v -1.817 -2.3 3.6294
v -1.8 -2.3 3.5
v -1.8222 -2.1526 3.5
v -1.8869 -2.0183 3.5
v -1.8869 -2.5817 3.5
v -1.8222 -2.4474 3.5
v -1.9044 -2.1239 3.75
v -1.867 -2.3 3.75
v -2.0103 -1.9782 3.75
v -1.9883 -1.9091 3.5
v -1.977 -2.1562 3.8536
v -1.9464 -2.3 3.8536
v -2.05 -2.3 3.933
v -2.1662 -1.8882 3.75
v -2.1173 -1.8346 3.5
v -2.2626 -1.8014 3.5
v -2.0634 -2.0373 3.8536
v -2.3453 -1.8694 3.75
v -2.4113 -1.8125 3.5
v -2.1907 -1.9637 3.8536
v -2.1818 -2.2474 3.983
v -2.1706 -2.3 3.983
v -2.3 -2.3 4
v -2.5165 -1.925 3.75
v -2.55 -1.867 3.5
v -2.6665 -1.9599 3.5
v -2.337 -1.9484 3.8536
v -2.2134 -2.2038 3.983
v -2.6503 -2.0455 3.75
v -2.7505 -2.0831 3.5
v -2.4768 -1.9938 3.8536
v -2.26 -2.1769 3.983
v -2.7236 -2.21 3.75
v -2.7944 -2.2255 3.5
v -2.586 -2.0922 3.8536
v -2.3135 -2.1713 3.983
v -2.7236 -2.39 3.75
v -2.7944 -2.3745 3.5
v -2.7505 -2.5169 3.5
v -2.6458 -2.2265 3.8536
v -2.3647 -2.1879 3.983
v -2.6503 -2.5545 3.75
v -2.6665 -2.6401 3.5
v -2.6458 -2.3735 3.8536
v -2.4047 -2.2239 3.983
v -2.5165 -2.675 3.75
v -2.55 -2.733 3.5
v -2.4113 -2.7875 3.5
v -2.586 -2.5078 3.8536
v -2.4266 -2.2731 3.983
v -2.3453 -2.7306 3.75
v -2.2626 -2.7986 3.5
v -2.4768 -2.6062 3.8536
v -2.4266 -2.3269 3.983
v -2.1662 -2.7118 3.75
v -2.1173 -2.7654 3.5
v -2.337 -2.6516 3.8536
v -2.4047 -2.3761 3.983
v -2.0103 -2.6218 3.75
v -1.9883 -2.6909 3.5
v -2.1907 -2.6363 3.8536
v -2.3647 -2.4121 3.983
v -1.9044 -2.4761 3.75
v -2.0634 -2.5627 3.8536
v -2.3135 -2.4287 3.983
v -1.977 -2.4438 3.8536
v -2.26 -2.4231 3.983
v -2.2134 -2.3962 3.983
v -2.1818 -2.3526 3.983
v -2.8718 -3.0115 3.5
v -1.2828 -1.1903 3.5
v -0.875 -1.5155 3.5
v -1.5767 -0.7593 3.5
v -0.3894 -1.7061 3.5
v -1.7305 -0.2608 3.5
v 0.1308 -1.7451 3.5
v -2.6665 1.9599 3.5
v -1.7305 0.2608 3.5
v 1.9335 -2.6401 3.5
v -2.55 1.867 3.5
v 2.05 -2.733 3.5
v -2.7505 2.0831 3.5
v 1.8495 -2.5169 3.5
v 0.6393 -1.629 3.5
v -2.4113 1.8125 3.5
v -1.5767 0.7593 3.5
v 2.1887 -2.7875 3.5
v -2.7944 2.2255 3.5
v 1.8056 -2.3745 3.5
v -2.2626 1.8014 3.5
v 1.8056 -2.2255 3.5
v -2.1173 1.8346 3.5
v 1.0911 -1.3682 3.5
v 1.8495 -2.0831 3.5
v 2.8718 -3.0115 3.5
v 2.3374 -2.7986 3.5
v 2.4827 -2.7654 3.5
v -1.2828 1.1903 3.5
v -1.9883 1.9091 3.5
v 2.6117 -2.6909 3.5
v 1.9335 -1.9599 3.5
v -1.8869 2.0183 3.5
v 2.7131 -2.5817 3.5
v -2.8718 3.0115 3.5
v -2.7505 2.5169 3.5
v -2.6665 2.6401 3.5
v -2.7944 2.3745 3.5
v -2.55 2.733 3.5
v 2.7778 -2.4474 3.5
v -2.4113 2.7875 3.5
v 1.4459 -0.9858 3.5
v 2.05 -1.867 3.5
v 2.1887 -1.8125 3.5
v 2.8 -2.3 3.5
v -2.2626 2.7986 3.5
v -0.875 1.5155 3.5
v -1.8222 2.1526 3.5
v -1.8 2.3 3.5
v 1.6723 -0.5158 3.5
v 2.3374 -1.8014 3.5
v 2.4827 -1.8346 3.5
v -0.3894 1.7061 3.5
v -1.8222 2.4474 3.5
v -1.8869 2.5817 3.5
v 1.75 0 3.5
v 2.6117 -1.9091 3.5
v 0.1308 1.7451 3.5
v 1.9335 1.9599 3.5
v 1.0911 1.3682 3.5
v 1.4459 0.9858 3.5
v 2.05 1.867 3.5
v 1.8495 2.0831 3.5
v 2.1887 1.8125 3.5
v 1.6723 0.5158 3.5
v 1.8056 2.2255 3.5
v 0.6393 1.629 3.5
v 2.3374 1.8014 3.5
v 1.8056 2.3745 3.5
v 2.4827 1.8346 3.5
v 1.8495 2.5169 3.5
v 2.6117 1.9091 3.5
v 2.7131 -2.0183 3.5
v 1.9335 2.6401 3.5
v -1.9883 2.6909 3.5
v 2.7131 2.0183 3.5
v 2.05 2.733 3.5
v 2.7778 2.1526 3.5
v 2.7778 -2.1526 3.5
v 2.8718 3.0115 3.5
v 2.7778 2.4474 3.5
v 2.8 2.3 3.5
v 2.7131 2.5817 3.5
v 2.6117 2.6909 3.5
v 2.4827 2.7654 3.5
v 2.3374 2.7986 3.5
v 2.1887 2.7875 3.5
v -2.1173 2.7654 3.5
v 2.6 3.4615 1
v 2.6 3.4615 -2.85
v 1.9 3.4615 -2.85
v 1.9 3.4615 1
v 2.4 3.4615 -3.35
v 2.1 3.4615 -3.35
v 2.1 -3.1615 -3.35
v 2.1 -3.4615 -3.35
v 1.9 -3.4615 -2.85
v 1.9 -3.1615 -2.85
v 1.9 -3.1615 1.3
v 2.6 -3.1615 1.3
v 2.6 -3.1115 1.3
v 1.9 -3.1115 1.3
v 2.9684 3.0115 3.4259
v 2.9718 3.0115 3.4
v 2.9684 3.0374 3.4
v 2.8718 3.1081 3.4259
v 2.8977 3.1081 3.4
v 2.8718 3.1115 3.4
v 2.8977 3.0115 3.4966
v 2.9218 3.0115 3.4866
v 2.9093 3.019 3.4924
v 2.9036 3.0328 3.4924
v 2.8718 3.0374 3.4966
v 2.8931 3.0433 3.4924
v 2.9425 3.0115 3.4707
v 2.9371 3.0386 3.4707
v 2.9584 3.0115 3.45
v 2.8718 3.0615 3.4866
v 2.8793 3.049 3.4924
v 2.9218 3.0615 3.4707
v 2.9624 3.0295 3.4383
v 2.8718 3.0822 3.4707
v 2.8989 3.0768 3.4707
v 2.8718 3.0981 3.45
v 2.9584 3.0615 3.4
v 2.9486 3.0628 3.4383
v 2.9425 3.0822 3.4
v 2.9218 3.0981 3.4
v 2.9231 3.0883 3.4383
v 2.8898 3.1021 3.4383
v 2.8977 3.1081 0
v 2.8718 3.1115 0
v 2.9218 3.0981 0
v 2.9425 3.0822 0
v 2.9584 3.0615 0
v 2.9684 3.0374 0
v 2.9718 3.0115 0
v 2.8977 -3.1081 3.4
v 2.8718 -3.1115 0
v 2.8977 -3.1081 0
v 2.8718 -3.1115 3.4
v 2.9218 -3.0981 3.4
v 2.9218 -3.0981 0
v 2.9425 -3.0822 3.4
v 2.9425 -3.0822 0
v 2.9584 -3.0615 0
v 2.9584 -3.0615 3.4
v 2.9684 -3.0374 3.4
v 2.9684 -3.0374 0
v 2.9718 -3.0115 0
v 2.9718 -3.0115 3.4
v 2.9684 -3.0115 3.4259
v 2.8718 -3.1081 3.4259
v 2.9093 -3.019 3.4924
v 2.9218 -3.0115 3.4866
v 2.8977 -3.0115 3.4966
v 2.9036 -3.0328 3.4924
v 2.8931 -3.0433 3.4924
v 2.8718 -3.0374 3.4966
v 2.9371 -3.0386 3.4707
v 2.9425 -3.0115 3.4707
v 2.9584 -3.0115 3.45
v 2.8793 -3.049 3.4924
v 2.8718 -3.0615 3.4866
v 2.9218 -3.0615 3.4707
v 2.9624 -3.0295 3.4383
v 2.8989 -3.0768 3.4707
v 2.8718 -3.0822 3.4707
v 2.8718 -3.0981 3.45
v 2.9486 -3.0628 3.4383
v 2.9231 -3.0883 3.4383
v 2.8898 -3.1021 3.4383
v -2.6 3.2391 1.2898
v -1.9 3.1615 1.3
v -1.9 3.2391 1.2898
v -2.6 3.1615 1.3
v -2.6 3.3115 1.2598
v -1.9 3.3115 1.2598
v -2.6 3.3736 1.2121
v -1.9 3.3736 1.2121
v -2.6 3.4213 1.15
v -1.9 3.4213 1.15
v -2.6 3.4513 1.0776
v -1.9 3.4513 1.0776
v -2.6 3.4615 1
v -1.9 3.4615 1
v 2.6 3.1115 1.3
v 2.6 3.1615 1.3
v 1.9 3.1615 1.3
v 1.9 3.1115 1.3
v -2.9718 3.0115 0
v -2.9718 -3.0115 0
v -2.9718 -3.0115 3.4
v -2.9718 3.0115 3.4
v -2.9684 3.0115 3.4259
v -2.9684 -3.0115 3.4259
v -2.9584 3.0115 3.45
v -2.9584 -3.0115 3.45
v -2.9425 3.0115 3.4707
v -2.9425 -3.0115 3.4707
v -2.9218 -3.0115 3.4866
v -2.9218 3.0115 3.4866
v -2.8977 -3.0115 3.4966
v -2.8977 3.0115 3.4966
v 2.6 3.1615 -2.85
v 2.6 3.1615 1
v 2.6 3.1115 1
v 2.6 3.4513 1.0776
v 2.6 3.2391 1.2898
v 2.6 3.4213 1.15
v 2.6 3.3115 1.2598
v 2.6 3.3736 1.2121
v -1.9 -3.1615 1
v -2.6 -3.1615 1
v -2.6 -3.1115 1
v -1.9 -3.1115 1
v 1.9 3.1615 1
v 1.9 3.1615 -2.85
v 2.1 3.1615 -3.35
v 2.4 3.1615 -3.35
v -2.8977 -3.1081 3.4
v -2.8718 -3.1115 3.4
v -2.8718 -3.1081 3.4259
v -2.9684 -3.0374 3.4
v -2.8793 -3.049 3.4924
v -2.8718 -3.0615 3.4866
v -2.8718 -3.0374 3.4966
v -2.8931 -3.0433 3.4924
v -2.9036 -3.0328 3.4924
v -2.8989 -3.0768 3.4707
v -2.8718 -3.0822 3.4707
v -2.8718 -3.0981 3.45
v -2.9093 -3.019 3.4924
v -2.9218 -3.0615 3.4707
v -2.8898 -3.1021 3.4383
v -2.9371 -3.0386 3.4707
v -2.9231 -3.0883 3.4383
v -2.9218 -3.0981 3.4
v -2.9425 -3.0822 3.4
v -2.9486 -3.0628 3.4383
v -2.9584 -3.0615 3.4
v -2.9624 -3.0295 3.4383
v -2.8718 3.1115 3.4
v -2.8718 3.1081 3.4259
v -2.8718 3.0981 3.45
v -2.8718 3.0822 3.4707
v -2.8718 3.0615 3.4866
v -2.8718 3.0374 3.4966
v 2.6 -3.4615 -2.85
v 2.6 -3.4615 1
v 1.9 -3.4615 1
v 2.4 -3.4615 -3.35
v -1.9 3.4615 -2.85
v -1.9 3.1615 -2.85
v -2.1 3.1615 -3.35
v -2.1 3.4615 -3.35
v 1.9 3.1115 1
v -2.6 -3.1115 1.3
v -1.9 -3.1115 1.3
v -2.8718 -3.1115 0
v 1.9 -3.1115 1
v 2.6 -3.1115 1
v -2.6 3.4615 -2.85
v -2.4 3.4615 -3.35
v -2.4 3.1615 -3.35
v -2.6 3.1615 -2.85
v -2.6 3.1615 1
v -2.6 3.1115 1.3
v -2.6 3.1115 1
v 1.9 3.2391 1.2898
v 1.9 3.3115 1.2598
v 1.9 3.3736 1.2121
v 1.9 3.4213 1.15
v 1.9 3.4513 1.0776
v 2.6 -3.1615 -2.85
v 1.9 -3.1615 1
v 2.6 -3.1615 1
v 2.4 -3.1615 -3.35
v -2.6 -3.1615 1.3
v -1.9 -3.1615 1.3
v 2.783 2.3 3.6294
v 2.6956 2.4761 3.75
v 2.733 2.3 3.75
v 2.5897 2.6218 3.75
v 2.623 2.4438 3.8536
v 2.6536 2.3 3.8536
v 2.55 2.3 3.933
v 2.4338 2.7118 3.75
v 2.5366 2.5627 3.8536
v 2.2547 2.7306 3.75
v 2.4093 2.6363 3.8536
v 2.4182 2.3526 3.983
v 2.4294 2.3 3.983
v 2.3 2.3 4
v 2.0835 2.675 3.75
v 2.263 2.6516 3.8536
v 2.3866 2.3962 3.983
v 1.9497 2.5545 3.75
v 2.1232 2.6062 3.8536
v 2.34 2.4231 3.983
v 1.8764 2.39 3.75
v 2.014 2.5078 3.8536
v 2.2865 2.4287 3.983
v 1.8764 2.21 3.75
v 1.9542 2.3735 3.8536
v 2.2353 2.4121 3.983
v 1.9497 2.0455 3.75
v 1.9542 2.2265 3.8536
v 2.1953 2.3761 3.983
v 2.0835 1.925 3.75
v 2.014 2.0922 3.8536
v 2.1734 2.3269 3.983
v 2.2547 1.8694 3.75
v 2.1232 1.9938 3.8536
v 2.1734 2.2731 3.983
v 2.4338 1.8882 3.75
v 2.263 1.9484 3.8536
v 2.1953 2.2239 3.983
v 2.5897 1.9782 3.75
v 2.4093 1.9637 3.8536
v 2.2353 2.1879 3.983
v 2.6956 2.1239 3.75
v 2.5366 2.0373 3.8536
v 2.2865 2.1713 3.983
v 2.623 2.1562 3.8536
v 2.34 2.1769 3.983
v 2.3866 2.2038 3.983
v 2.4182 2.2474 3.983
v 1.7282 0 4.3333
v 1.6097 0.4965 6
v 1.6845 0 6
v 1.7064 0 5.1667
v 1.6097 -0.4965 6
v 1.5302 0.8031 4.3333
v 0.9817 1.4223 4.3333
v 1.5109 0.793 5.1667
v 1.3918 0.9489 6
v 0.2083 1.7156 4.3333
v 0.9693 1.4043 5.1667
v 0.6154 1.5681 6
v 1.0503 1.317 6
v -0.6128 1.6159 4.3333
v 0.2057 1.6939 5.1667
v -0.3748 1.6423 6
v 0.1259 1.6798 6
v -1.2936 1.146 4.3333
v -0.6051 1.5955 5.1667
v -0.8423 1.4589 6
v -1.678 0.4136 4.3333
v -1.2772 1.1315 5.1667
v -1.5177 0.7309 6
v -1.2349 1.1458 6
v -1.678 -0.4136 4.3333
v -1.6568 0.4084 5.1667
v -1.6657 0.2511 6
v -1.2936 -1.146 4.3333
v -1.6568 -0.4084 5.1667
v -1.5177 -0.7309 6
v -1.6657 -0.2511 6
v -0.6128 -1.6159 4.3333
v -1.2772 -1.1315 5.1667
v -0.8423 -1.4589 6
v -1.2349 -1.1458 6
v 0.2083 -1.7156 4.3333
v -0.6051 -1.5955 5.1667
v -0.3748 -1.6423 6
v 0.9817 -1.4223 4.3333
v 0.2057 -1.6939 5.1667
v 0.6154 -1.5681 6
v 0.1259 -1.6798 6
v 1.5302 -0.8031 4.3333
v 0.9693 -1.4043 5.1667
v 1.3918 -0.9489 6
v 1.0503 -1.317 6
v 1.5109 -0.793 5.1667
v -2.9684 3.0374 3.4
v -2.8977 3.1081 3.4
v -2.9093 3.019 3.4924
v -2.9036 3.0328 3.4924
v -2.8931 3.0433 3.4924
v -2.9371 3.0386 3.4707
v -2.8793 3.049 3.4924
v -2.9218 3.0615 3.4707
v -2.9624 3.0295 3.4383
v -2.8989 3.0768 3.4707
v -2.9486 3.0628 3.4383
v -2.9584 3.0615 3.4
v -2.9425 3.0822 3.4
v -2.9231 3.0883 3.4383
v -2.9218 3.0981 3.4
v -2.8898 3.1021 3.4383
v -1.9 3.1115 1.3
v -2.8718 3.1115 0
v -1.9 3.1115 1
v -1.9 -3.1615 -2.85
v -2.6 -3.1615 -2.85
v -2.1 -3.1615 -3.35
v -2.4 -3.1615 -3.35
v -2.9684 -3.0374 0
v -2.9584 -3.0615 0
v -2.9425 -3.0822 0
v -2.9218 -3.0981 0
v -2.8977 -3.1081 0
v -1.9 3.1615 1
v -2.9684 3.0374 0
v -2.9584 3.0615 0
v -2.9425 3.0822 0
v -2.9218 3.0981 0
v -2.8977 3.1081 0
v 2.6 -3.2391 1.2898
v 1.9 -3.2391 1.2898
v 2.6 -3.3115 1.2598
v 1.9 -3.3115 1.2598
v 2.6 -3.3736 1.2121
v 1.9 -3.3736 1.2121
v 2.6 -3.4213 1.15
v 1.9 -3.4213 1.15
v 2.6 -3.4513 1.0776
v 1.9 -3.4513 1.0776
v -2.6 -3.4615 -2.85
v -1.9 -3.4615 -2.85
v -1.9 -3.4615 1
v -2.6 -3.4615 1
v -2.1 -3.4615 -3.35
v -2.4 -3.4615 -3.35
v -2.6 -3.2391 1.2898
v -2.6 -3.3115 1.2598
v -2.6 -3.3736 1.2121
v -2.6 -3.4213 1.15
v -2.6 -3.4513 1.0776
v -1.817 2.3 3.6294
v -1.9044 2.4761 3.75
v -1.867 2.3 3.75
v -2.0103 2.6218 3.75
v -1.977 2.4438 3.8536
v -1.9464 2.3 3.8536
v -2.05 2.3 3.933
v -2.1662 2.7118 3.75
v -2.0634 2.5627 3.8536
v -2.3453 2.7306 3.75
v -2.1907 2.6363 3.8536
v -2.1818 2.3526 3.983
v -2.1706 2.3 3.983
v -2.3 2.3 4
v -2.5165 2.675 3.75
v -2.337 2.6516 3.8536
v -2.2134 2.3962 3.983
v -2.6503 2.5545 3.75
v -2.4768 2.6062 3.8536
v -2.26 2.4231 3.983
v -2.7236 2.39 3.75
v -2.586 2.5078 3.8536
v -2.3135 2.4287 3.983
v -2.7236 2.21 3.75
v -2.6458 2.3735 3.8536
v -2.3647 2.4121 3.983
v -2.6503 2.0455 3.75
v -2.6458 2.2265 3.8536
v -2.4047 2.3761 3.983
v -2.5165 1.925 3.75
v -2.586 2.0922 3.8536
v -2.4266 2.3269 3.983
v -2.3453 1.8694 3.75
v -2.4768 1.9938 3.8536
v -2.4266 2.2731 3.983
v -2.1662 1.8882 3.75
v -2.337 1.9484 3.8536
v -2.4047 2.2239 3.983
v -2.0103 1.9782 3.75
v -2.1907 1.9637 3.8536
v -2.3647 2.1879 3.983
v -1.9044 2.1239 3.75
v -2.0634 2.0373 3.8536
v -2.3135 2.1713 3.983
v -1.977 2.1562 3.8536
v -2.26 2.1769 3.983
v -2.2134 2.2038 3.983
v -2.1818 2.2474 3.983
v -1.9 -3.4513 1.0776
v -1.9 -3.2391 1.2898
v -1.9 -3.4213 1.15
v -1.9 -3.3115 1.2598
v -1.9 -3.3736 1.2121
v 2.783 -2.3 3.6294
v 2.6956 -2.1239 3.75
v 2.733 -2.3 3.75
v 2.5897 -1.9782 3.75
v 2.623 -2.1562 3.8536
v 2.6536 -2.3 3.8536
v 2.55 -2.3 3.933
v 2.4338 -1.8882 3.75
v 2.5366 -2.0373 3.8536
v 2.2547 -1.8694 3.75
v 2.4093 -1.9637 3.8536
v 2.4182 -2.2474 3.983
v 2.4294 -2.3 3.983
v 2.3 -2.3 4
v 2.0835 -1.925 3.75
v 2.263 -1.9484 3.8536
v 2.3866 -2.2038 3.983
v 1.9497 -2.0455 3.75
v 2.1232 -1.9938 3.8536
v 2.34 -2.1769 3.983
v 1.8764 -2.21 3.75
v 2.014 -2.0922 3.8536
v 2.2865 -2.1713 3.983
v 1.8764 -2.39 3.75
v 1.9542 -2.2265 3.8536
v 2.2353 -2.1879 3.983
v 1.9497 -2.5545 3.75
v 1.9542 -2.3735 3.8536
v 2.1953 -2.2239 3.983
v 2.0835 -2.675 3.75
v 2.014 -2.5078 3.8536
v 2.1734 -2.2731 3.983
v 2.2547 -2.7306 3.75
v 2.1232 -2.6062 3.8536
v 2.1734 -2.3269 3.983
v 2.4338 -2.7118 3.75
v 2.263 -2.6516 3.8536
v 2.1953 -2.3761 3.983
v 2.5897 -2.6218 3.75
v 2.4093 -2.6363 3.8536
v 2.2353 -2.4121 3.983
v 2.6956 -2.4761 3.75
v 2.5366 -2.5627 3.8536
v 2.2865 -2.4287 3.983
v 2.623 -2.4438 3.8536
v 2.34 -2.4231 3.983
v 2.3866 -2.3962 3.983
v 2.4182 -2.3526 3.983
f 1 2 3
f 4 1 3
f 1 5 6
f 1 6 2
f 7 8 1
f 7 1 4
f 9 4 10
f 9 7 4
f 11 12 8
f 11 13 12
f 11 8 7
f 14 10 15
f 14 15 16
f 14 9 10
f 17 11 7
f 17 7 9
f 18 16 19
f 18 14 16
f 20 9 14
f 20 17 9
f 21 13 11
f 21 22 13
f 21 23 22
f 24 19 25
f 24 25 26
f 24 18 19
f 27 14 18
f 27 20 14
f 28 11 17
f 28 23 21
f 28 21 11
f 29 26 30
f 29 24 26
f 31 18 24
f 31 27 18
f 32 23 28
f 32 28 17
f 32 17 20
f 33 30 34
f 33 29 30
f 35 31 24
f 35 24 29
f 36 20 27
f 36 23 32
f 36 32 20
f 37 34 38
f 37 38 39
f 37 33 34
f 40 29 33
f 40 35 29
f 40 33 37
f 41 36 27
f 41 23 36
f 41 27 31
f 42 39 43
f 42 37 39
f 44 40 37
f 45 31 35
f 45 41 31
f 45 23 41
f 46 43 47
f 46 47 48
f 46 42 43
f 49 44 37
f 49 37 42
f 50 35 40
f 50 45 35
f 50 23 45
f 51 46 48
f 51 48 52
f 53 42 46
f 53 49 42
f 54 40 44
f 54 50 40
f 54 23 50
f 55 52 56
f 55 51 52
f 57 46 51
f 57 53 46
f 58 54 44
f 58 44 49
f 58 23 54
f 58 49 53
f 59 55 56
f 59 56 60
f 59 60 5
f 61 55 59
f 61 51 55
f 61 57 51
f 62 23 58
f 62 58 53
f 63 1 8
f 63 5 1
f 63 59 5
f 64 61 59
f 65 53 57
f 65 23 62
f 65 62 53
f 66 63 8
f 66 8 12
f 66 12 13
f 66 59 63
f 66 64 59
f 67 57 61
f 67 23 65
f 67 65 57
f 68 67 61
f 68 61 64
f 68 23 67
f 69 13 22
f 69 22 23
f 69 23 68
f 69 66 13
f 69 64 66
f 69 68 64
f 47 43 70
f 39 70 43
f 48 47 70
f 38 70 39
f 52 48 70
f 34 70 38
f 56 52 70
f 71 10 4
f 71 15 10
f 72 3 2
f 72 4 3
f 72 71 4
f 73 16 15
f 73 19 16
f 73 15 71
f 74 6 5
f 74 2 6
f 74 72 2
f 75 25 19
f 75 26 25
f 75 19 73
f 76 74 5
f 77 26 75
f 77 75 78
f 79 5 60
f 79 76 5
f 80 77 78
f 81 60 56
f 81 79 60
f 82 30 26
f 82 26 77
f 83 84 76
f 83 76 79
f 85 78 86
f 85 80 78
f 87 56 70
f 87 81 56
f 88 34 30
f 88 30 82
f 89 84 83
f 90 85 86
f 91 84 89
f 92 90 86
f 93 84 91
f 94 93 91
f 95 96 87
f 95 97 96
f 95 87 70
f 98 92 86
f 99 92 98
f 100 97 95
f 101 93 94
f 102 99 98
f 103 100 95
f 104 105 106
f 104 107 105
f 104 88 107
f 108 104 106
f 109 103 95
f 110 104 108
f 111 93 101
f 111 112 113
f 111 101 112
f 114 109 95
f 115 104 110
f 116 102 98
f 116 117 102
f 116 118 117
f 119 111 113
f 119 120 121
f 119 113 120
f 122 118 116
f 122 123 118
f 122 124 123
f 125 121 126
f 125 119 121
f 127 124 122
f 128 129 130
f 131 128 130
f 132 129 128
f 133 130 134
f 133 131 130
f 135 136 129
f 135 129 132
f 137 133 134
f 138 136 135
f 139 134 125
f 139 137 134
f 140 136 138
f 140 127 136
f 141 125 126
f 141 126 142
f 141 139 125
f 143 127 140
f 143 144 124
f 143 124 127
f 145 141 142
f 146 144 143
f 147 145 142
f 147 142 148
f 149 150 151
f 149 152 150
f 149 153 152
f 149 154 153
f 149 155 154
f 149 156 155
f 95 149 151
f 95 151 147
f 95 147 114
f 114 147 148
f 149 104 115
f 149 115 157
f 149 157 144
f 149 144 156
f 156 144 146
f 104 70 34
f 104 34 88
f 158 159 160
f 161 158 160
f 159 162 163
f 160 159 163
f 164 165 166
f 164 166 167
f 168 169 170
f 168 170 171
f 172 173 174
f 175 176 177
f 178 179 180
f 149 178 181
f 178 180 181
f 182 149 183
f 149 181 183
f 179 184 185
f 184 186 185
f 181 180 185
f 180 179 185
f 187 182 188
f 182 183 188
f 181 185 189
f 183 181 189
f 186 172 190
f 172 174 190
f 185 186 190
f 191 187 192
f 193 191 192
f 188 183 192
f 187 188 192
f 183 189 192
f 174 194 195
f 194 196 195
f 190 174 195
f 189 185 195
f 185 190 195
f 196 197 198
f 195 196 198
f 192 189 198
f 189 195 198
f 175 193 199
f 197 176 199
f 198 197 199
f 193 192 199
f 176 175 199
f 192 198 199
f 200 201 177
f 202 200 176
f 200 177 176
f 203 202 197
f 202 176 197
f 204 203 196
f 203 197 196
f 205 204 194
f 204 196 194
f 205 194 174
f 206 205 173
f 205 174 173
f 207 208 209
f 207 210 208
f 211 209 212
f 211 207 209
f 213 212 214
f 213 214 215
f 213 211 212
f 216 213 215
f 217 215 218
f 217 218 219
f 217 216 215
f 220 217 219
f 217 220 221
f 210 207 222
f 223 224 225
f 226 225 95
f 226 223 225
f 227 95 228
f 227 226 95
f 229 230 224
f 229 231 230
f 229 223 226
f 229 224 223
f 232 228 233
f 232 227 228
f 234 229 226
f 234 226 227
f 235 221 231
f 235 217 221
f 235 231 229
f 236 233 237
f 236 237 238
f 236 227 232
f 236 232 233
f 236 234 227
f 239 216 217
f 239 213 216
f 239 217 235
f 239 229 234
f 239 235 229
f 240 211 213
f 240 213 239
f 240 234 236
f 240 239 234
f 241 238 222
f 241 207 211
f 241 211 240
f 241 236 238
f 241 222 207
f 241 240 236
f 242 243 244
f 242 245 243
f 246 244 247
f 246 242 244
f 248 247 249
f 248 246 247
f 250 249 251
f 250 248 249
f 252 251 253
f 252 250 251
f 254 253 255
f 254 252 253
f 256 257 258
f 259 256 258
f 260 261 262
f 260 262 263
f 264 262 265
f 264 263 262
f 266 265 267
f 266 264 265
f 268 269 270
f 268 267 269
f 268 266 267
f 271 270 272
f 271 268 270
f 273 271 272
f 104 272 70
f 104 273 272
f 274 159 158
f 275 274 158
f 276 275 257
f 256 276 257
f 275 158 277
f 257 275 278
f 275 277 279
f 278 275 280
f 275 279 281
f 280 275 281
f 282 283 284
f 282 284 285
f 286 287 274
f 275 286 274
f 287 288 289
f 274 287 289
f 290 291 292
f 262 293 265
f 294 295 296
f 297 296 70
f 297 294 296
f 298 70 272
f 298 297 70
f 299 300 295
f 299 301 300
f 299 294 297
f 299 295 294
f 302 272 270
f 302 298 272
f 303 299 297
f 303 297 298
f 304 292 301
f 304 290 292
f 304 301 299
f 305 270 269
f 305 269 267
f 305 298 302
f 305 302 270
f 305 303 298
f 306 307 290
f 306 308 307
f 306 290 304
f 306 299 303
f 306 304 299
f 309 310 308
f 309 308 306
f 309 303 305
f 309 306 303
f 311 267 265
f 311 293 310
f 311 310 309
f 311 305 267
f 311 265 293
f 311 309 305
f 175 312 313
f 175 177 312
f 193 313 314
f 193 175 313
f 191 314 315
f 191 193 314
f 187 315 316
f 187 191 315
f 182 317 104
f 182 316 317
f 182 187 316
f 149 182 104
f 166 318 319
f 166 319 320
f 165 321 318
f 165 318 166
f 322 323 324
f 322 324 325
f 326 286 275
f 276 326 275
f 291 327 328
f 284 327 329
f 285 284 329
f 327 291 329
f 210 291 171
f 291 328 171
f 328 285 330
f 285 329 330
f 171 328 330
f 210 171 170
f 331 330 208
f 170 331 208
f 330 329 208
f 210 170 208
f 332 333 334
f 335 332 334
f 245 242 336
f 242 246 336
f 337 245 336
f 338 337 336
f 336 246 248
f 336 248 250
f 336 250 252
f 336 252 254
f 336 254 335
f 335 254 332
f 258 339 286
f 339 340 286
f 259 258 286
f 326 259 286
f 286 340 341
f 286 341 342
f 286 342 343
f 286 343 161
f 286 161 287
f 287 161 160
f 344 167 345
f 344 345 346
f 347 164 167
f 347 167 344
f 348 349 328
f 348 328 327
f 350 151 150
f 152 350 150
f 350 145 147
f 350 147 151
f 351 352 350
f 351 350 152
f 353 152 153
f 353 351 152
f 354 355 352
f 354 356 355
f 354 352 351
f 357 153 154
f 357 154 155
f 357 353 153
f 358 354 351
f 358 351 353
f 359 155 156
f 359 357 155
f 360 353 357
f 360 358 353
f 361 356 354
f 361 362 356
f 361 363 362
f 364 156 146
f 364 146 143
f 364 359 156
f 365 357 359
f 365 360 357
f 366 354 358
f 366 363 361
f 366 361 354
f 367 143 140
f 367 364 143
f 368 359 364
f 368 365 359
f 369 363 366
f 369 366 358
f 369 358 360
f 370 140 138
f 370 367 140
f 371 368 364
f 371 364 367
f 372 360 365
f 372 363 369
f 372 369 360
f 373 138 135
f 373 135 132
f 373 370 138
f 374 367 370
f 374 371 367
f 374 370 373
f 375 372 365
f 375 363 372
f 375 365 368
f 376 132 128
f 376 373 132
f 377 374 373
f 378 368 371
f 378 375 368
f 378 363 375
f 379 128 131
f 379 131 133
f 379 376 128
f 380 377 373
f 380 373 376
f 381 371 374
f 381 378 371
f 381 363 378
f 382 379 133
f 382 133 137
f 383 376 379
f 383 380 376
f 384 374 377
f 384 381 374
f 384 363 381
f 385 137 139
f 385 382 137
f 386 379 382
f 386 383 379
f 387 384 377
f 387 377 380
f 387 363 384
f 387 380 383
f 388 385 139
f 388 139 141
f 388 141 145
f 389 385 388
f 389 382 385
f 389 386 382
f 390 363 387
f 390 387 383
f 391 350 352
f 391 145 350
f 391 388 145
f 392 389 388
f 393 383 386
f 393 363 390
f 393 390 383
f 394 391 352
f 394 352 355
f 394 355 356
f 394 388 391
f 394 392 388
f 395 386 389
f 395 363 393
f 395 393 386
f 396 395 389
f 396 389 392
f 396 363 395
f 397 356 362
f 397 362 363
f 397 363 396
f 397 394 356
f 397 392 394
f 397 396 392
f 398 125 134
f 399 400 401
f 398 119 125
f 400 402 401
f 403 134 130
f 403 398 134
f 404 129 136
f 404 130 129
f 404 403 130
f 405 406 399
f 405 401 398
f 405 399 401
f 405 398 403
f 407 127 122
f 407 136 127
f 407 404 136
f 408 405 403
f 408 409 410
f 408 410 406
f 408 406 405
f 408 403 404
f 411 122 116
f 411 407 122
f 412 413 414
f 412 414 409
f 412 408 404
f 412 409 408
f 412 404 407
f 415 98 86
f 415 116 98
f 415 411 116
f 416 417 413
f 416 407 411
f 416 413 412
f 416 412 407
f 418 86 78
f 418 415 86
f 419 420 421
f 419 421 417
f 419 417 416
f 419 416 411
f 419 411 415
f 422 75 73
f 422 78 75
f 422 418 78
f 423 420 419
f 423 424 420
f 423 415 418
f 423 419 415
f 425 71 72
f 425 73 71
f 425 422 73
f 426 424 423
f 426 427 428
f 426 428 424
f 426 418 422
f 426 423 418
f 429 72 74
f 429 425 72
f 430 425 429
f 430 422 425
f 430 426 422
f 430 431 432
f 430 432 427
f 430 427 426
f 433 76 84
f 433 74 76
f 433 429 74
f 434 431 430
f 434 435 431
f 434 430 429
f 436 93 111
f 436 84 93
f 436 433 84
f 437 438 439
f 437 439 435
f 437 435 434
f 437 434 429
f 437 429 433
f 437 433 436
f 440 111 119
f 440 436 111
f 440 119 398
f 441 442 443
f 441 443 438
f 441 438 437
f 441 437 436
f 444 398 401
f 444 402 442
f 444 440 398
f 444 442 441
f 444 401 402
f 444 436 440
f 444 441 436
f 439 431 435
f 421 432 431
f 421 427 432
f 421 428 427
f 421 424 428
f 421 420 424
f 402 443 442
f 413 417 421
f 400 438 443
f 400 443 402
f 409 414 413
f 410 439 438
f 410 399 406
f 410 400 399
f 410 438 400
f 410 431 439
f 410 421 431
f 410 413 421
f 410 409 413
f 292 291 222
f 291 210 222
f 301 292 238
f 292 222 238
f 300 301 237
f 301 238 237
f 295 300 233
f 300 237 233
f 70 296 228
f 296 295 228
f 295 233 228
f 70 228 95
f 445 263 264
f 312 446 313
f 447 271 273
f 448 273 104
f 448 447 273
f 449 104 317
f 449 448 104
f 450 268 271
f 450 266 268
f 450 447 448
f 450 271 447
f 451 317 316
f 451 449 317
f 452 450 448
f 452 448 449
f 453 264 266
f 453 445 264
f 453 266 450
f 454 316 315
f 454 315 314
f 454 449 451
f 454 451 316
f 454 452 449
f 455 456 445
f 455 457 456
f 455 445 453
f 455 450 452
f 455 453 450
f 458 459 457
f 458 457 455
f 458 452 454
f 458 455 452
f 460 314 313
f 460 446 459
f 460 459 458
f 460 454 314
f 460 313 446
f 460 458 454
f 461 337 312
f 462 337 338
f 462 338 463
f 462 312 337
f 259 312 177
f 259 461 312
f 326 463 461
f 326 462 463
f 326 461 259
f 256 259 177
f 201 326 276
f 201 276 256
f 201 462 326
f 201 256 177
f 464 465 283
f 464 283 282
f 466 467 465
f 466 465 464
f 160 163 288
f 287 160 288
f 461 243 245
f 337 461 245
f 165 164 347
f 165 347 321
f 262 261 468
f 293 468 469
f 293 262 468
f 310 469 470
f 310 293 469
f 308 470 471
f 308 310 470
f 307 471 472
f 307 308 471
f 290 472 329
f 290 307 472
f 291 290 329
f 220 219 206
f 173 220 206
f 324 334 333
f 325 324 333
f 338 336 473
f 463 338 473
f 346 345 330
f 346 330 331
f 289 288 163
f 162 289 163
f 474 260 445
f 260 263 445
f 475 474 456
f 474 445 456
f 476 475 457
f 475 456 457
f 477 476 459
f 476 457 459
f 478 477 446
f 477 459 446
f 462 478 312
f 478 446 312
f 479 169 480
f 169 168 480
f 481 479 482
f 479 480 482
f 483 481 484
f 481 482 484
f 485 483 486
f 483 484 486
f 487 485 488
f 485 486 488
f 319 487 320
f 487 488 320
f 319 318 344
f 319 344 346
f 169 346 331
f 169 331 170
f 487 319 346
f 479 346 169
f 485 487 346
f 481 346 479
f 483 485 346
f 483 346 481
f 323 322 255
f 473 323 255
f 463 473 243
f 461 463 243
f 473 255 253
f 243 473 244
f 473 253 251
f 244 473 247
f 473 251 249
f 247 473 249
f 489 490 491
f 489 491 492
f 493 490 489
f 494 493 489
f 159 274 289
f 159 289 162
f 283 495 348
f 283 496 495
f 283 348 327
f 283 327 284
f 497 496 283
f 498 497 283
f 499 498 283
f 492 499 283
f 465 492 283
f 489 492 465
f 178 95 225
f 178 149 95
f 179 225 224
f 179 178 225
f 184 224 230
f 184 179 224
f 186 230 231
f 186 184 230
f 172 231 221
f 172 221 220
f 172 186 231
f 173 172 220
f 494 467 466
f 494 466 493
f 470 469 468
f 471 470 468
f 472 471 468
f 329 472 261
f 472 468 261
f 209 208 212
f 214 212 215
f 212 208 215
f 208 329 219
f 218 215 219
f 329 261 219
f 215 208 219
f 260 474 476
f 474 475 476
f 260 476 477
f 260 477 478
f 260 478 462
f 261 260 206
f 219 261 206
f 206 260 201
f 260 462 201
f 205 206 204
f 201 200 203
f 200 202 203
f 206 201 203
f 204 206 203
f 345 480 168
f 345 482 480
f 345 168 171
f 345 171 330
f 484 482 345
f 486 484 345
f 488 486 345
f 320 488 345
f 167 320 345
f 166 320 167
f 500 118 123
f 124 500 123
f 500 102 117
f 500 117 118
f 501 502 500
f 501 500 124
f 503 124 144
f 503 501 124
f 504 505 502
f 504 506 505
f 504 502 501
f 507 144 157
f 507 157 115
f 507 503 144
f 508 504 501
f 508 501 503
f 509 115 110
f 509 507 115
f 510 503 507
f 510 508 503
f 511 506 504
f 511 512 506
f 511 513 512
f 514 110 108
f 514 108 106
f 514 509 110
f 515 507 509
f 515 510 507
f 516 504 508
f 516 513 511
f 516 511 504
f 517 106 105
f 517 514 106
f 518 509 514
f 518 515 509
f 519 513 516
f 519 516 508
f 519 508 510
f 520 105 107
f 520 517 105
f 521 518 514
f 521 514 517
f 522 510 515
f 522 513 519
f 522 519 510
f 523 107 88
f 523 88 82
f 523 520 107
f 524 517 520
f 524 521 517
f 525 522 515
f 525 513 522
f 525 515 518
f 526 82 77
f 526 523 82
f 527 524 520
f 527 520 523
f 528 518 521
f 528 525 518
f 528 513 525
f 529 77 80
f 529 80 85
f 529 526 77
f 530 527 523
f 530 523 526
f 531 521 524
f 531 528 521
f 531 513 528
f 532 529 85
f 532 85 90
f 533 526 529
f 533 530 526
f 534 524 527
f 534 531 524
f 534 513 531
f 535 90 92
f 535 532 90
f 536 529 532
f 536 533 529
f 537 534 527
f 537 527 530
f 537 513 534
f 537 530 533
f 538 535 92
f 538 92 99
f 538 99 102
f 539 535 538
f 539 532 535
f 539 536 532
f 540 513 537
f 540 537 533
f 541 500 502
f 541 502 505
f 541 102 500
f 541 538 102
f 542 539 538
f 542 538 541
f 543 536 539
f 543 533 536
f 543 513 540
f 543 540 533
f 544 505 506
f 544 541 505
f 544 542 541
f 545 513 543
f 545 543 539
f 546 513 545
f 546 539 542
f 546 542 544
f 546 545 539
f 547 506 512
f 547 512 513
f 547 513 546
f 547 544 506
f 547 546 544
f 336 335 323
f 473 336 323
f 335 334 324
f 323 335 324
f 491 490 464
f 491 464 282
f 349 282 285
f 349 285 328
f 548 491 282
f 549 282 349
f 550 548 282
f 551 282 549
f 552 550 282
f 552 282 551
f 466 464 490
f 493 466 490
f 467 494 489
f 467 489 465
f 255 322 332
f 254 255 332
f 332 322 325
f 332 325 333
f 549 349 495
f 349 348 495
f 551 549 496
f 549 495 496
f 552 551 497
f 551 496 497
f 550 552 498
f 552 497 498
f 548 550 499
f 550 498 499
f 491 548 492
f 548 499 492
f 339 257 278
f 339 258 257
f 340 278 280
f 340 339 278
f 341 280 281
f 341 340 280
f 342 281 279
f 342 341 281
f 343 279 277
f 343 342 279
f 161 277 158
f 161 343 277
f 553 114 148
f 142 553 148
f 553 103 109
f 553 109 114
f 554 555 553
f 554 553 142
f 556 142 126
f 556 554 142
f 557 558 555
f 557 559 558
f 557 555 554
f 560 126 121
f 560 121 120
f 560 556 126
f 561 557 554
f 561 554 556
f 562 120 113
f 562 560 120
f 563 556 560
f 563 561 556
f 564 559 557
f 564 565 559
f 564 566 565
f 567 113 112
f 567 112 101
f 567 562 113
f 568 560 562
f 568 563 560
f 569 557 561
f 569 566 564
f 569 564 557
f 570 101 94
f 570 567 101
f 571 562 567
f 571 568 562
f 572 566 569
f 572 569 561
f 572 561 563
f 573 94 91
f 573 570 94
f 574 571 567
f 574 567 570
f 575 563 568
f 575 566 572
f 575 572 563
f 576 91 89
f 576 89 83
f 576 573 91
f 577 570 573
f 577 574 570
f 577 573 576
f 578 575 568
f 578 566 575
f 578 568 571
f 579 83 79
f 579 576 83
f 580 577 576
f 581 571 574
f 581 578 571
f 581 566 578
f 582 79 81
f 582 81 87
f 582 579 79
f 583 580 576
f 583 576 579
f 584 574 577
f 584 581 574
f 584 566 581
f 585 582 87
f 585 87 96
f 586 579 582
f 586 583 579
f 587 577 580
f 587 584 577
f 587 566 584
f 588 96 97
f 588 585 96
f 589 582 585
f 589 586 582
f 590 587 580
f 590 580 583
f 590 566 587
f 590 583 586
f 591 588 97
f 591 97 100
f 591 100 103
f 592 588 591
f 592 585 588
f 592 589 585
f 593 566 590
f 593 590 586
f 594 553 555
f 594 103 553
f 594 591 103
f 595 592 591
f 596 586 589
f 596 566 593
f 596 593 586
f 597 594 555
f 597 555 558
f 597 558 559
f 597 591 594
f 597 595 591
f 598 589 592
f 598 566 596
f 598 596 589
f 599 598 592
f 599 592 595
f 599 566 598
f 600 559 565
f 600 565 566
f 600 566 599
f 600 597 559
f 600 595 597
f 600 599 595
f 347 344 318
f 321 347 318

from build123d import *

# Parameters (mm, degrees)
F0_W        = 5.9436
F0_H        = 6.223
F1_DEPTH    = 3.5
F2_R        = 1.75
F3_DEPTH    = 2.5
F3_TAPER    = 1.5
F4_R        = 0.1
F5_R        = 0.5
F6_DEPTH    = 0.5
F7_R        = 0.49999
F8_W        = 0.7
F8_H        = 0.3
F11_SIZE2   = 0.5
F11_SIZE    = 0.2
F11_2_SIZE2 = 0.5
F11_2_SIZE  = 0.2


# Not quite as in the source:
# - a fillet or chamfer is up to 0.001 mm smaller than in the source, because OpenCascade refuses the exact size


with BuildPart() as f1:
    # F0 (on Top) → F1 (new body)
    with BuildSketch(Plane.XY):
        Rectangle(F0_W, F0_H)
    extrude(amount=F1_DEPTH)

    # F2 (on face) → F3 (join)
    with BuildSketch(Plane.XY.offset(3.5)):
        Circle(F2_R)
    extrude(amount=F3_DEPTH, taper=F3_TAPER)

    # F4
    f4_edges = [f1.edges().sort_by_distance(p)[0] for p in [
        (2.9718, -3.1115, 1.75),
        (-2.9718, -3.1115, 1.75),
        (-2.9718, 3.1115, 1.75),
        (2.9718, 3.1115, 1.75),
        (2.9718, 0, 3.5),
        (0, -3.1115, 3.5),
        (-2.9718, 0, 3.5),
        (0, 3.1115, 3.5),
    ]]
    fillet(f4_edges, radius=F4_R)

    # F5 (on face) → F6 (join)
    with BuildSketch(Plane.XY.offset(3.5)):
        with Locations((2.3, -2.3)):
            Circle(F5_R)
        with Locations((2.3, 2.3)):
            Circle(F5_R)
        with Locations((-2.3, 2.3)):
            Circle(F5_R)
        with Locations((-2.3, -2.3)):
            Circle(F5_R)
    extrude(amount=F6_DEPTH)

    # F7 (radius 0.5 in the source; OpenCascade refuses exactly that, so slightly less here)
    f7_edges = [f1.edges().sort_by_distance(p)[0] for p in [
        (1.8, -2.3, 4),
        (1.8, 2.3, 4),
        (-2.8, 2.3, 4),
        (-2.8, -2.3, 4),
    ]]
    fillet(f7_edges, radius=F7_R)

    # F10: sweep along a path in F9
    with BuildLine(Plane.YZ) as f10_path:
        Line((-3.1115, 1.15), (-3.1615, 1.15))
        ThreePointArc((-3.1615, 1.15), (-3.2675660172, 1.1060660172), (-3.3115, 1))
        Line((-3.3115, 1), (-3.3115, -3.35))
    # F8 (on face) → F10 (sweep)
    with BuildSketch(Plane.XZ.offset(3.1115)):
        with Locations((-2.25, 1.15)):
            Rectangle(F8_W, F8_H)
        with Locations((2.25, 1.15)):
            Rectangle(F8_W, F8_H)
    sweep(path=f10_path.line)

    # F11
    f11_edges = [f1.edges().sort_by_distance(p)[0] for p in [
        (-2.6, -3.3115, -3.35),
        (-1.9, -3.3115, -3.35),
    ]]
    f11_side = f1.faces().sort_by_distance((-2.25, -3.3115, -3.35))[0]
    chamfer(f11_edges, length=F11_SIZE, length2=F11_SIZE2, reference=f11_side)

    # F11#2
    f11_2_edges = [f1.edges().sort_by_distance(p)[0] for p in [
        (1.9, -3.3115, -3.35),
        (2.6, -3.3115, -3.35),
    ]]
    f11_2_side = f1.faces().sort_by_distance((2.25, -3.3115, -3.35))[0]
    chamfer(f11_2_edges, length=F11_2_SIZE, length2=F11_2_SIZE2, reference=f11_2_side)

    # F12: F1 across plane


with BuildPart() as f1_1:
    add(f1.part)
    add(f1.part.mirror(Plane.XZ))


solid = f1_1.part
